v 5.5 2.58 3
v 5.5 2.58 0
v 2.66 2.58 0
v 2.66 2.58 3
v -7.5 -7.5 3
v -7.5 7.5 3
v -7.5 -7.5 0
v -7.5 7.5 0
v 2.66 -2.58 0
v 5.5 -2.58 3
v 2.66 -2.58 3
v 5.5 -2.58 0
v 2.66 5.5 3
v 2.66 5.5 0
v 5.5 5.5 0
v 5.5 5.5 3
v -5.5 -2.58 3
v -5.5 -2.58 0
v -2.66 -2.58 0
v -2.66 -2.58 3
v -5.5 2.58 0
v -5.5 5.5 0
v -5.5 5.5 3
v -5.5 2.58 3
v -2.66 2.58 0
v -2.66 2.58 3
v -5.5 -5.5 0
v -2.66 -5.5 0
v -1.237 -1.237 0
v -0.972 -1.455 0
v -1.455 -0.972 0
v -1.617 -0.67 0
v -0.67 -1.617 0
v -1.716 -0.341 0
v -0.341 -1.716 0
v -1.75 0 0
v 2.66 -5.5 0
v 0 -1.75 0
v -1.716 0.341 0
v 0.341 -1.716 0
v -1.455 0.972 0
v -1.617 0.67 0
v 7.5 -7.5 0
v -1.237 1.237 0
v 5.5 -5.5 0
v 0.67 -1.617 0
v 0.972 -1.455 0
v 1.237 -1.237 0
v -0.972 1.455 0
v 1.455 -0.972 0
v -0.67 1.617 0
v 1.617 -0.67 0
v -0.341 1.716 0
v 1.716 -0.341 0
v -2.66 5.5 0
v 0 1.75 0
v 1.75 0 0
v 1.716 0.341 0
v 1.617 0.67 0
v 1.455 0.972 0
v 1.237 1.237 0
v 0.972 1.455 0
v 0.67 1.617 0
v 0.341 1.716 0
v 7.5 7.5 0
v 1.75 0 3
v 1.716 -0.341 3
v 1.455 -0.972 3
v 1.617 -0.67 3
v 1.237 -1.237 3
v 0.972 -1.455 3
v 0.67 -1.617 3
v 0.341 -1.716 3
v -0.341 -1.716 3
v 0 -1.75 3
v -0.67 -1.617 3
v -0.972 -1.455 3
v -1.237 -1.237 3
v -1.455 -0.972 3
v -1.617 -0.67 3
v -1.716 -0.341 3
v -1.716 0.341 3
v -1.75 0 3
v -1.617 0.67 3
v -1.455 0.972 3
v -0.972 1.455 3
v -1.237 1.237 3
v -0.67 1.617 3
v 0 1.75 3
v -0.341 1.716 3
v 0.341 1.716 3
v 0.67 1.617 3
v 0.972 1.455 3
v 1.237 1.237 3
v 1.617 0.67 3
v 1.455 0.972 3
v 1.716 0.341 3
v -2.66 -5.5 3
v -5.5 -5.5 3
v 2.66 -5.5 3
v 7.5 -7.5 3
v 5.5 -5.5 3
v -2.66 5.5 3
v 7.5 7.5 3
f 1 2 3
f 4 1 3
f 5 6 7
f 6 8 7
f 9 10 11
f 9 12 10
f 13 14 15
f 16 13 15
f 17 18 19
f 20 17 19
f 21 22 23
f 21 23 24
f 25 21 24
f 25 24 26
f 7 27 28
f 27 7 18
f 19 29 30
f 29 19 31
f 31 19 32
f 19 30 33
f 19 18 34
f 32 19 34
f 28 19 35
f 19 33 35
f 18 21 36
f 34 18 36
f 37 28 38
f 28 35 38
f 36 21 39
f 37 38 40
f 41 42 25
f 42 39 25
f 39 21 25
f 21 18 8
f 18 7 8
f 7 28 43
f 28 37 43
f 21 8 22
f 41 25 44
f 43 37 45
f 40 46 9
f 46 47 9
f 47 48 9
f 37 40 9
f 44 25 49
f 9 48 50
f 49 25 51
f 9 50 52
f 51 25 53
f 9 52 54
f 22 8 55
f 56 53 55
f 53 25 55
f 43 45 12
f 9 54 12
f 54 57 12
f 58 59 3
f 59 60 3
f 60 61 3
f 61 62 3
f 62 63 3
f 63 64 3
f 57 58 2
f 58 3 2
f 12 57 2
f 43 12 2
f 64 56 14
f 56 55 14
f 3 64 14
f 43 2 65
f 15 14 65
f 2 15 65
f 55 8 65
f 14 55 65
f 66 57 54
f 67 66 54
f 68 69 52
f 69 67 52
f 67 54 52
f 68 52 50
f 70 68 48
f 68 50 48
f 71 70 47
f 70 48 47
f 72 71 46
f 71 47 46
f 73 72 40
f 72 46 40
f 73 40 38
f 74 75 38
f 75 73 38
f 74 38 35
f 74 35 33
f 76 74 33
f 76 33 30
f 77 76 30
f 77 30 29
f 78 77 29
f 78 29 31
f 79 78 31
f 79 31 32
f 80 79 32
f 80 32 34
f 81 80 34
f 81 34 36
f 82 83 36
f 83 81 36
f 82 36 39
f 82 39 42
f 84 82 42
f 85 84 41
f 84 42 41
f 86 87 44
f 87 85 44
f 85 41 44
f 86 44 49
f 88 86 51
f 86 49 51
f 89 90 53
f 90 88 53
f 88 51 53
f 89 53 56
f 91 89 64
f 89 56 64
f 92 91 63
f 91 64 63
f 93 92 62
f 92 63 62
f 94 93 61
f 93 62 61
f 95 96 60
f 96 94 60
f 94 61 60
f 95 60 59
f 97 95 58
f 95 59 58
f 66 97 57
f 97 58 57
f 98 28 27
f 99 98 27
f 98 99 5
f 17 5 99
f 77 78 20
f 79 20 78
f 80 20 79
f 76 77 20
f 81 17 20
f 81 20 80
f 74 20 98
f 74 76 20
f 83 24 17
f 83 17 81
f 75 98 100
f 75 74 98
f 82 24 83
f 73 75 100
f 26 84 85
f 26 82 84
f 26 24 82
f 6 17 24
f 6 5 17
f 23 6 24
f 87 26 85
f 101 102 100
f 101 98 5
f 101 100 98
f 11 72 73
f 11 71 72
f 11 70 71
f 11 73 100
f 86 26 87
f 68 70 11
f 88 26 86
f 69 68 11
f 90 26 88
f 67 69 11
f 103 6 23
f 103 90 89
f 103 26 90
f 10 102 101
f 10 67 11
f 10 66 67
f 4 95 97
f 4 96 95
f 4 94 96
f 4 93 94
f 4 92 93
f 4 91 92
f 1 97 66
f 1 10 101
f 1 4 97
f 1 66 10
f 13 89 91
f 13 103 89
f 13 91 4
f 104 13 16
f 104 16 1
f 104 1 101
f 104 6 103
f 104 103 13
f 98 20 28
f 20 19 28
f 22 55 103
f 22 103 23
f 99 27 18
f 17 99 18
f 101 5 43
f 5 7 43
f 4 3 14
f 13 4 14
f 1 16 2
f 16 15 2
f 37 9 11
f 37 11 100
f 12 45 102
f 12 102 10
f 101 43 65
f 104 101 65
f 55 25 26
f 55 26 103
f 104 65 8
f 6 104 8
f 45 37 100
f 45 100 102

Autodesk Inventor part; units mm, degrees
ref_plane "YZ Plane" through (0, 0, 0) normal (1, 0, 0) x (0, 1, 0)
ref_plane "XZ Plane" through (0, 0, 0) normal (0, 1, 0) x (-1, 0, 0)
ref_plane "XY Plane" through (0, 0, 0) normal (0, 0, 1) x (1, 0, 0)
sketch "Sketch1" plane through (0, 0, 0) normal (0, 0, 1) x (1, 0, 0)
  line L0 (-7.5, -7.5) -> (7.5, -7.5)
  line L1 (7.5, -7.5) -> (7.5, 7.5)
  line L2 (7.5, 7.5) -> (-7.5, 7.5)
  line L3 (-7.5, 7.5) -> (-7.5, -7.5)
  line L4 (-7.5, -7.5) -> (7.5, 7.5) construction
  line L5 (7.5, -7.5) -> (-7.5, 7.5) construction
  line L6 (-5.5, 2.58) -> (-2.66, 2.58)
  line L7 (-2.66, 2.58) -> (-2.66, 5.5)
  line L8 (-2.66, 5.5) -> (-5.5, 5.5)
  line L9 (-5.5, 5.5) -> (-5.5, 2.58)
  line L10 (0, 0) -> (0, 4.08) construction
  line L11 (0, 0) -> (5.4269, 0) construction
  line L12 (2.66, 2.58) -> (2.66, 5.5)
  line L13 (2.66, 5.5) -> (5.5, 5.5)
  line L14 (5.5, 5.5) -> (5.5, 2.58)
  line L15 (5.5, 2.58) -> (2.66, 2.58)
  line L16 (2.66, -2.58) -> (2.66, -5.5)
  line L17 (5.5, -2.58) -> (2.66, -2.58)
  line L18 (5.5, -5.5) -> (5.5, -2.58)
  line L19 (2.66, -5.5) -> (5.5, -5.5)
  line L20 (-5.5, -2.58) -> (-2.66, -2.58)
  line L21 (-2.66, -5.5) -> (-5.5, -5.5)
  line L22 (-5.5, -5.5) -> (-5.5, -2.58)
  line L23 (-2.66, -2.58) -> (-2.66, -5.5)
  circle A0 centre (0, 0) radius 1.75
  dimension "d2" = 15
  dimension "d4" = 2.84
  dimension "d5" = 2.92
  dimension "d6" = 2
  dimension "d7" = 2
  dimension "d8" = 3.5
extrude "Extrusion1" add sketch "Sketch1" along normal blind 3
equation "\"d6\" = d7"
equation "\"d8\" = stickL"
equation "\"thick\" = 0.5"
equation "\"lrlr\" = 19"
equation "\"lrmid\" = 19.9"
equation "\"lrdepth\" = 3.3"
equation "\"mlr\" = 16.6"
equation "\"mmid\" = 24.7"
equation "\"mdepth\" = 4.5"
equation "\"lrltotal\" = 126.6"
equation "\"mltotal\" = 126.6"
equation "\"lrbetween\" = 52.1"
equation "\"mbetween\" = 49.5"
equation "\"toler\" = 1"
equation "\"tight\" = 0.08"
equation "\"stuckw\" = 6"
equation "\"sidewallL\" = 132.6"
equation "\"heaterH\" = 117.3"
equation "\"stickL\" = 3.5"
equation "\"wireH\" = 25"
properties part number "motor_top"
